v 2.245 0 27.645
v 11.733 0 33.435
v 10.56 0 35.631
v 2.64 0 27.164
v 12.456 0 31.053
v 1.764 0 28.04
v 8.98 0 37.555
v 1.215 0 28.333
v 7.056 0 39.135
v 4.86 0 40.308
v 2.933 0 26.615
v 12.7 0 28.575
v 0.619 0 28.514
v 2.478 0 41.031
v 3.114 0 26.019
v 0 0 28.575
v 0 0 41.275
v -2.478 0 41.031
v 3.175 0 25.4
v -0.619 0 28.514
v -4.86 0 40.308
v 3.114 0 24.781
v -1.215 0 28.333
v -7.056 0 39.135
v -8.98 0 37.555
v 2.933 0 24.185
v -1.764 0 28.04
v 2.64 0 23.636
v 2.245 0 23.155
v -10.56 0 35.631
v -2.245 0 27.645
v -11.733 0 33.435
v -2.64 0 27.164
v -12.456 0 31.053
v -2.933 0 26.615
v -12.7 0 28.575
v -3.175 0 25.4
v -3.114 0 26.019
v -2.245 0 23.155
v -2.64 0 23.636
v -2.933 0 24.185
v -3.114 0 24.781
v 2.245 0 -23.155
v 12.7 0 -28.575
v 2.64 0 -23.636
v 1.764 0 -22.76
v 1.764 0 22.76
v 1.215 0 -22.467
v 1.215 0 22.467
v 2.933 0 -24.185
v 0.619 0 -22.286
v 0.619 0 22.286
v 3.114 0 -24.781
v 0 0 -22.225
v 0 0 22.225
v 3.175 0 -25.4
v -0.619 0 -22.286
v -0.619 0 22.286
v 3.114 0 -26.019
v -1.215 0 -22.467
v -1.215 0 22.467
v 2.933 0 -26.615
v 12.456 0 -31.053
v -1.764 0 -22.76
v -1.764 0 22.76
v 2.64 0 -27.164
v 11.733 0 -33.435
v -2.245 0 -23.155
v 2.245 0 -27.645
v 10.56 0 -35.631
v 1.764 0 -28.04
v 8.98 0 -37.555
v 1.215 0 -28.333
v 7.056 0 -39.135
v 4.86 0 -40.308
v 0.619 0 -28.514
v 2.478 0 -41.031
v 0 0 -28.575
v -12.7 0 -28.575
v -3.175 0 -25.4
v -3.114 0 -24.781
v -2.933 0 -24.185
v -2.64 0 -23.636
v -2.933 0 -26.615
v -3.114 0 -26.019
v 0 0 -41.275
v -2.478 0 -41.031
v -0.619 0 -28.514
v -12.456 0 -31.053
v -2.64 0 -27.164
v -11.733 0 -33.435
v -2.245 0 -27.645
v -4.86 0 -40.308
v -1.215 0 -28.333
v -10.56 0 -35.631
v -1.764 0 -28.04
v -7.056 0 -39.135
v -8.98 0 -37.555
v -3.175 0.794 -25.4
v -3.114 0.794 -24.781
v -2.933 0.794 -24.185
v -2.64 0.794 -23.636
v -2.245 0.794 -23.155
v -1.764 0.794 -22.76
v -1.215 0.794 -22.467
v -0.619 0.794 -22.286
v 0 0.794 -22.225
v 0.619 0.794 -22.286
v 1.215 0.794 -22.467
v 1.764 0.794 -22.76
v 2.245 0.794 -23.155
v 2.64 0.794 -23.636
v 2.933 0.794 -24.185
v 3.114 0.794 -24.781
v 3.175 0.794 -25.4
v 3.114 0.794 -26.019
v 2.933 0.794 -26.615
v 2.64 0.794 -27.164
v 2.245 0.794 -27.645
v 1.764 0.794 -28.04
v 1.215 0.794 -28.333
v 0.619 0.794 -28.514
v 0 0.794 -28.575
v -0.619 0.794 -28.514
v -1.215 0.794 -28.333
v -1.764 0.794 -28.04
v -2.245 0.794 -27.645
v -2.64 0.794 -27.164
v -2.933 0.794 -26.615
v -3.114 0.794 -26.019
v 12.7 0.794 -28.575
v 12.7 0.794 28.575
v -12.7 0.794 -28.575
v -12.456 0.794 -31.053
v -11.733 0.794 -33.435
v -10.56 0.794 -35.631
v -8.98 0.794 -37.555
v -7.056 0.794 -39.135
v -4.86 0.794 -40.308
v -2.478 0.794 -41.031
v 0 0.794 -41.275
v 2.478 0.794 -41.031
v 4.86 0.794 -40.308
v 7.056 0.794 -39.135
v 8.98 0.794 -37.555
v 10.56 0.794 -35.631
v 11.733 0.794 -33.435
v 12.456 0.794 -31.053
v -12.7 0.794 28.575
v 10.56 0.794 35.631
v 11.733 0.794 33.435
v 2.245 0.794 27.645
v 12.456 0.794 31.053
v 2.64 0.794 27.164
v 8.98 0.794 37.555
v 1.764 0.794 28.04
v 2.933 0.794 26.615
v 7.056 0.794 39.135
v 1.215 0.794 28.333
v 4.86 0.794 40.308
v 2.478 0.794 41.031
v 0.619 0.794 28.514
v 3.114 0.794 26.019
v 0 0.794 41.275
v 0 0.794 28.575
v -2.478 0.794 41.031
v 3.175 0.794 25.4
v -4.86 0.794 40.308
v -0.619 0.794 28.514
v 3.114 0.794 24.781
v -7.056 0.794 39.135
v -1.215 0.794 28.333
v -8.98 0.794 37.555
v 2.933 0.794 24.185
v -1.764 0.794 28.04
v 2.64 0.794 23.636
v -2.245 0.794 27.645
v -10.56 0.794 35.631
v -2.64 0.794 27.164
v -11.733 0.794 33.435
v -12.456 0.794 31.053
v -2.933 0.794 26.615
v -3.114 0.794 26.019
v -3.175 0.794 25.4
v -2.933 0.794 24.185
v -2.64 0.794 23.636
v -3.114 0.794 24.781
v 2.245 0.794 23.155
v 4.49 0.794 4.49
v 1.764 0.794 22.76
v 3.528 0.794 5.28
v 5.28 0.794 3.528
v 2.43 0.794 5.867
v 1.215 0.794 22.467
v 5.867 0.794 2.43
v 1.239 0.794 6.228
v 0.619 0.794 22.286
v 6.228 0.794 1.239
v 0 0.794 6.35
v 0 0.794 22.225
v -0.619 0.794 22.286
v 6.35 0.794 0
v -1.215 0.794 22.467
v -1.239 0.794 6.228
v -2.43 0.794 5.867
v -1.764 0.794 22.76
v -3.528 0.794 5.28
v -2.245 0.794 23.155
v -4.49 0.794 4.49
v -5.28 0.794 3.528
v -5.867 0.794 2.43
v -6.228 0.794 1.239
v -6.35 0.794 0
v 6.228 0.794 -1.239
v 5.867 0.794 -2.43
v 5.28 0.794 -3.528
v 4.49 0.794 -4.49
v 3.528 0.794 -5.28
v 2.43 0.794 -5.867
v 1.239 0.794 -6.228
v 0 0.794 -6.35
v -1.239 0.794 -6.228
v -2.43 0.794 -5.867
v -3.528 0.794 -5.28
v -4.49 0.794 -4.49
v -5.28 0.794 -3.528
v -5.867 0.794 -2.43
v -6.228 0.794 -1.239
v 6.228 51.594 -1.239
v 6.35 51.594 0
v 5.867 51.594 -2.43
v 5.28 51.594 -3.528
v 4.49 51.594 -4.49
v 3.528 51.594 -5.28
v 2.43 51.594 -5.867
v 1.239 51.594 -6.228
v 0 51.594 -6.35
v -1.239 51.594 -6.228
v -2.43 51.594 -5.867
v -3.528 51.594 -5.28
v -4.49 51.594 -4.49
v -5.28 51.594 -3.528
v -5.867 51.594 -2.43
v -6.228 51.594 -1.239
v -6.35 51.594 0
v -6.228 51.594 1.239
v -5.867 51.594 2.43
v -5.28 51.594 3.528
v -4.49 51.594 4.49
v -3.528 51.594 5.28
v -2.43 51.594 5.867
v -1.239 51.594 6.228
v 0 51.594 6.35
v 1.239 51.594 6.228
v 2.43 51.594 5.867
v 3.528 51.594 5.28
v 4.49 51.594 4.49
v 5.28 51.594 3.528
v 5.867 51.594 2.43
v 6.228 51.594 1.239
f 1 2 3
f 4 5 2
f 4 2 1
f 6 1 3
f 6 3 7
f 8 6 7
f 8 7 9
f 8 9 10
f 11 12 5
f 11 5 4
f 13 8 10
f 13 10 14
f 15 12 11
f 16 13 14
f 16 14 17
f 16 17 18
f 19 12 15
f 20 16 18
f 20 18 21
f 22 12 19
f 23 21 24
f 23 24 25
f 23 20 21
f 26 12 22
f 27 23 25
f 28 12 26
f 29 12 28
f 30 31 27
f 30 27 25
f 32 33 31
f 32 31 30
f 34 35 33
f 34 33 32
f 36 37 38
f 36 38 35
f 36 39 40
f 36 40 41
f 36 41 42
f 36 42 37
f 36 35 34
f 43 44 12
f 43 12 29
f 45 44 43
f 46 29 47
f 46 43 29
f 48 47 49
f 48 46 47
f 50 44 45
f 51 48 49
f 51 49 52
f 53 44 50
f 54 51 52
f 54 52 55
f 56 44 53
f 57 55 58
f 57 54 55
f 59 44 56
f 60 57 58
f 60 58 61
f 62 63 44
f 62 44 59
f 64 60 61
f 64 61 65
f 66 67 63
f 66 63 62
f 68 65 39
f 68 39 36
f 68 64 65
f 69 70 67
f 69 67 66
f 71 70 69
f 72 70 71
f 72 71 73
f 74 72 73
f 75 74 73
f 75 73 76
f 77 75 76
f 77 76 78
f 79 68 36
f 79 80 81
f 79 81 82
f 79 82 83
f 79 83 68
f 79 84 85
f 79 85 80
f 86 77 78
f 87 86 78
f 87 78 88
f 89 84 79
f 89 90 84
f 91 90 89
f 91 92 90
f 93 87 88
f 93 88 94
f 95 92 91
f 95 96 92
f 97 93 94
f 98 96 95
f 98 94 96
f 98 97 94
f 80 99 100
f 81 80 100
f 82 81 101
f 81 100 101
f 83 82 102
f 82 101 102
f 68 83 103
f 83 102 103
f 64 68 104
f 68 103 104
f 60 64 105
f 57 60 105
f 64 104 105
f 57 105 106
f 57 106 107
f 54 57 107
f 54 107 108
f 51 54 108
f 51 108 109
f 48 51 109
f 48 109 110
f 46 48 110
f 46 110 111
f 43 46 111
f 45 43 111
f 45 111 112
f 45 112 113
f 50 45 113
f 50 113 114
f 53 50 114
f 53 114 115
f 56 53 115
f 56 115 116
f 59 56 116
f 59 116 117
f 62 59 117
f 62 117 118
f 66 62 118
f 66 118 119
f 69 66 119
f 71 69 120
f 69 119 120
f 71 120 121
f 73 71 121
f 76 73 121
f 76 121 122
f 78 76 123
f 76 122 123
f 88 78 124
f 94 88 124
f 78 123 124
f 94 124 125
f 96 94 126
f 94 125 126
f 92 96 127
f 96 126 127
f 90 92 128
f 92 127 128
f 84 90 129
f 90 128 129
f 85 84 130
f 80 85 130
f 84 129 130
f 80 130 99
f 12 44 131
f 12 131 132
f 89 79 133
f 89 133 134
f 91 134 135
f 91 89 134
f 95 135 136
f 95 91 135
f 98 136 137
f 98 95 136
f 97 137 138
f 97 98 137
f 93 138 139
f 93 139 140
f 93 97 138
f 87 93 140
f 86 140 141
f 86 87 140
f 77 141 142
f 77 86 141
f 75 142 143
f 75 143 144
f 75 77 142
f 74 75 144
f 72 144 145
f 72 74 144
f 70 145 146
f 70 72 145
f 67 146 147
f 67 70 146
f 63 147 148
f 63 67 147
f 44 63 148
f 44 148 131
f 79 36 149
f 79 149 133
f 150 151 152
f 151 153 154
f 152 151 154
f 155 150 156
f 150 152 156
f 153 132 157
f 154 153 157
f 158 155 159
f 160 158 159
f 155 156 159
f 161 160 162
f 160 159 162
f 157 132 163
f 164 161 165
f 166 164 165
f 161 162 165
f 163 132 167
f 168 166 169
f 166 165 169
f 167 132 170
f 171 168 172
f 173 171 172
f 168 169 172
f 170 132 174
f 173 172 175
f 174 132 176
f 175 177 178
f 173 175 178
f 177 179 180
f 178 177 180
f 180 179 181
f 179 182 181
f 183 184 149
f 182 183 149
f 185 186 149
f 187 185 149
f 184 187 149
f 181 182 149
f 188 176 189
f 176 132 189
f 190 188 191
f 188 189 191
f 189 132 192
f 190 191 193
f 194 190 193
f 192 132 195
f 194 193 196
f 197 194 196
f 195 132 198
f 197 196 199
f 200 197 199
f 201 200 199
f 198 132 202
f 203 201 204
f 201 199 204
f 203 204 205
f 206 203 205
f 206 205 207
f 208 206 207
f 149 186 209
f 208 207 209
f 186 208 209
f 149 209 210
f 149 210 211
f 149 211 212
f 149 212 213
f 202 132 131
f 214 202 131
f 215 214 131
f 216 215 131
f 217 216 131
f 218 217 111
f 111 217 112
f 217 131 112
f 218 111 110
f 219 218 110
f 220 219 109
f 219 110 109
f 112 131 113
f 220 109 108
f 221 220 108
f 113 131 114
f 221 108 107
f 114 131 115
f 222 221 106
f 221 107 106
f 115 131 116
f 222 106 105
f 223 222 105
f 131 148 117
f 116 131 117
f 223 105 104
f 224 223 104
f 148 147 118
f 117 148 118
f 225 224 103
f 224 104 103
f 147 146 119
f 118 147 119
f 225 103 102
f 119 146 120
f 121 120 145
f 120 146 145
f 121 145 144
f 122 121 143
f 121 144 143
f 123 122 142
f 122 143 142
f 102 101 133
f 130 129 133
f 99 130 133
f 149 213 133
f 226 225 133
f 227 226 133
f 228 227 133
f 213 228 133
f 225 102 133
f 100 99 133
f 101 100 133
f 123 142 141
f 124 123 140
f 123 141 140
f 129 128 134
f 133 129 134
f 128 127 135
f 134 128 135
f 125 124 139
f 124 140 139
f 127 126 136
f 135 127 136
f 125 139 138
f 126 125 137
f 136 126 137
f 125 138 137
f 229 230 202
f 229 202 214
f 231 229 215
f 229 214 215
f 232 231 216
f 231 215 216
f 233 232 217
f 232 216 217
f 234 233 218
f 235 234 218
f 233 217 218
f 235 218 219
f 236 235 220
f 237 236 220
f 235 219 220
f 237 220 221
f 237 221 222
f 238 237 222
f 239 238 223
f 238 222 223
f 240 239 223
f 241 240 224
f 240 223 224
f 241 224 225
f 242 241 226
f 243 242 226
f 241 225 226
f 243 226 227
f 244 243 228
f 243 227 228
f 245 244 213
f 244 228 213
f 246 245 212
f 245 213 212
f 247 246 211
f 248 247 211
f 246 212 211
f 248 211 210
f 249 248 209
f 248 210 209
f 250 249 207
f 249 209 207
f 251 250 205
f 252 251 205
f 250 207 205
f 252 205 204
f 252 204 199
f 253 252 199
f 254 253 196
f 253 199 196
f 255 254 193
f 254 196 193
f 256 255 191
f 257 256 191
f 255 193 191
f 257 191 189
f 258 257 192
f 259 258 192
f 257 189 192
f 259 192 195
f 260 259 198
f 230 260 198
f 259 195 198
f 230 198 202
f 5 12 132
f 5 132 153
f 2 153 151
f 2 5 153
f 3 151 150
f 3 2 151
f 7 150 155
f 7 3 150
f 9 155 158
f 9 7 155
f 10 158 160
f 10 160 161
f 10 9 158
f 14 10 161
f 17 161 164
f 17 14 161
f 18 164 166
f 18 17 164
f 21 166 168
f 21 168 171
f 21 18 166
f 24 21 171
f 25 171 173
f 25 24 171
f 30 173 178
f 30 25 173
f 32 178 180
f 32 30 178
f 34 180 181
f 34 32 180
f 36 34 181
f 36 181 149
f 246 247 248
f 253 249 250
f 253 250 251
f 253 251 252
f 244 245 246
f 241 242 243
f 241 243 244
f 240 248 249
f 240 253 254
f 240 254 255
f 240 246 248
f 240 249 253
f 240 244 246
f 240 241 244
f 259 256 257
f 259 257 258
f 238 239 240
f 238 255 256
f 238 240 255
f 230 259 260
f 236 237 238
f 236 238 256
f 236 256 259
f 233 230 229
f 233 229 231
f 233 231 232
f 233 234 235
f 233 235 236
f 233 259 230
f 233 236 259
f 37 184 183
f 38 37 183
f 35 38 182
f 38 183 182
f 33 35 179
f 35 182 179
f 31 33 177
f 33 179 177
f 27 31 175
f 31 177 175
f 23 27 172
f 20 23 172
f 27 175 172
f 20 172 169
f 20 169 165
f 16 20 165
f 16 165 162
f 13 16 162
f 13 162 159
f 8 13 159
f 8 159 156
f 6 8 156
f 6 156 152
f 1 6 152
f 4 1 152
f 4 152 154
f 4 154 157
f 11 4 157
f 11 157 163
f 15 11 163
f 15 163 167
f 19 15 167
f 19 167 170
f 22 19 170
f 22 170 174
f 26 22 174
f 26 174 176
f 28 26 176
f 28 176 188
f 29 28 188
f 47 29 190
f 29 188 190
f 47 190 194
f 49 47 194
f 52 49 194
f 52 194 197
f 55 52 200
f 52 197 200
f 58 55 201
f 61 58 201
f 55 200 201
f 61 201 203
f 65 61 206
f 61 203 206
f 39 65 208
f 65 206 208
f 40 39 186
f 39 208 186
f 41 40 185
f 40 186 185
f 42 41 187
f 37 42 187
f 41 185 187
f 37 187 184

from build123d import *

# Parameters (mm, degrees)
BOSS_EXTRUDE1_DEPTH                            = 0.79375
CBORE_FOR_4_BUTTON_HEAD_CAP_SCREW1_D           = 3.2639
CBORE_FOR_4_BUTTON_HEAD_CAP_SCREW1_CBORE_D     = 6.35
CBORE_FOR_4_BUTTON_HEAD_CAP_SCREW1_CBORE_DEPTH = 1.4986
SKETCH6_R                                      = 6.35
BOSS_EXTRUDE2_DEPTH                            = 50.8


with BuildPart() as part:
    # Sketch1 → Boss-Extrude1 (new body)
    with BuildSketch(Plane(origin=(0, 0, 0), x_dir=(1, 0, 0), z_dir=(0, 1, 0))):
        with BuildLine():
            Line((-12.7, -28.575), (-12.7, 28.575))
            ThreePointArc((-12.7, 28.575), (0, 41.275), (12.7, 28.575))
            Line((12.7, 28.575), (12.7, -28.575))
            ThreePointArc((12.7, -28.575), (0, -41.275), (-12.7, -28.575))
        make_face()
    extrude(amount=BOSS_EXTRUDE1_DEPTH)

    # CBORE for #4 Button Head Cap Screw1 (through all)
    with Locations(Plane(origin=(0, 0.79375, 0), x_dir=(-1, 0, 0), z_dir=(0, 1, 0))):
        with Locations((0, 25.4), (0, -25.4)):
            CounterBoreHole(CBORE_FOR_4_BUTTON_HEAD_CAP_SCREW1_D / 2, CBORE_FOR_4_BUTTON_HEAD_CAP_SCREW1_CBORE_D / 2, CBORE_FOR_4_BUTTON_HEAD_CAP_SCREW1_CBORE_DEPTH)

    # Sketch6 → Boss-Extrude2 (add)
    with BuildSketch(Plane(origin=(0, 0.79375, 0), x_dir=(1, 0, 0), z_dir=(0, 1, 0))):
        Circle(SKETCH6_R)
    extrude(amount=BOSS_EXTRUDE2_DEPTH)


solid = part.part
